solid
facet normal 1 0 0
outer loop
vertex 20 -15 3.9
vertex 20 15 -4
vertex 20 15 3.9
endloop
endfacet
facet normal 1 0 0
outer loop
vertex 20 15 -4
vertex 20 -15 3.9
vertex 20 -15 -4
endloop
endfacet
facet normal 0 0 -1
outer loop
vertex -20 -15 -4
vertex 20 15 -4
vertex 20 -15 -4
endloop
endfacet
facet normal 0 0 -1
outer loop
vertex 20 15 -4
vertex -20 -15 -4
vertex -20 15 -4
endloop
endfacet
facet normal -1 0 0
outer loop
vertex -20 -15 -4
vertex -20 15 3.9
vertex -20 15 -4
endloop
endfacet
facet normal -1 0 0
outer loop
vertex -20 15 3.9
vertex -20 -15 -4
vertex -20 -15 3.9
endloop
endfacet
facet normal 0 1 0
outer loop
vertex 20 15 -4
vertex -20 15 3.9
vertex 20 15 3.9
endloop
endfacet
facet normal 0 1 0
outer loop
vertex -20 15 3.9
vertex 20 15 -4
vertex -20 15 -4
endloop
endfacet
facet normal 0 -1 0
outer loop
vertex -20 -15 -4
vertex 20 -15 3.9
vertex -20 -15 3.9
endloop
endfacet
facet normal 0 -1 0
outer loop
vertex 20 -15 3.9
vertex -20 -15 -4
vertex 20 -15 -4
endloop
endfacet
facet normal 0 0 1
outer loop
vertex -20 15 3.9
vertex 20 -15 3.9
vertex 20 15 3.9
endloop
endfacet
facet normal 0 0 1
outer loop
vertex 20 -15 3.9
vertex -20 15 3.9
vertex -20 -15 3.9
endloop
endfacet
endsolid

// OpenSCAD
difference() {
    // Main solid box
    cube([40, 30, 8], center=true);
    
    // Optional: small chamfer on top edges for visual clarity
    translate([0, 0, 4])
        cube([40.2, 30.2, 0.2], center=true);
}
